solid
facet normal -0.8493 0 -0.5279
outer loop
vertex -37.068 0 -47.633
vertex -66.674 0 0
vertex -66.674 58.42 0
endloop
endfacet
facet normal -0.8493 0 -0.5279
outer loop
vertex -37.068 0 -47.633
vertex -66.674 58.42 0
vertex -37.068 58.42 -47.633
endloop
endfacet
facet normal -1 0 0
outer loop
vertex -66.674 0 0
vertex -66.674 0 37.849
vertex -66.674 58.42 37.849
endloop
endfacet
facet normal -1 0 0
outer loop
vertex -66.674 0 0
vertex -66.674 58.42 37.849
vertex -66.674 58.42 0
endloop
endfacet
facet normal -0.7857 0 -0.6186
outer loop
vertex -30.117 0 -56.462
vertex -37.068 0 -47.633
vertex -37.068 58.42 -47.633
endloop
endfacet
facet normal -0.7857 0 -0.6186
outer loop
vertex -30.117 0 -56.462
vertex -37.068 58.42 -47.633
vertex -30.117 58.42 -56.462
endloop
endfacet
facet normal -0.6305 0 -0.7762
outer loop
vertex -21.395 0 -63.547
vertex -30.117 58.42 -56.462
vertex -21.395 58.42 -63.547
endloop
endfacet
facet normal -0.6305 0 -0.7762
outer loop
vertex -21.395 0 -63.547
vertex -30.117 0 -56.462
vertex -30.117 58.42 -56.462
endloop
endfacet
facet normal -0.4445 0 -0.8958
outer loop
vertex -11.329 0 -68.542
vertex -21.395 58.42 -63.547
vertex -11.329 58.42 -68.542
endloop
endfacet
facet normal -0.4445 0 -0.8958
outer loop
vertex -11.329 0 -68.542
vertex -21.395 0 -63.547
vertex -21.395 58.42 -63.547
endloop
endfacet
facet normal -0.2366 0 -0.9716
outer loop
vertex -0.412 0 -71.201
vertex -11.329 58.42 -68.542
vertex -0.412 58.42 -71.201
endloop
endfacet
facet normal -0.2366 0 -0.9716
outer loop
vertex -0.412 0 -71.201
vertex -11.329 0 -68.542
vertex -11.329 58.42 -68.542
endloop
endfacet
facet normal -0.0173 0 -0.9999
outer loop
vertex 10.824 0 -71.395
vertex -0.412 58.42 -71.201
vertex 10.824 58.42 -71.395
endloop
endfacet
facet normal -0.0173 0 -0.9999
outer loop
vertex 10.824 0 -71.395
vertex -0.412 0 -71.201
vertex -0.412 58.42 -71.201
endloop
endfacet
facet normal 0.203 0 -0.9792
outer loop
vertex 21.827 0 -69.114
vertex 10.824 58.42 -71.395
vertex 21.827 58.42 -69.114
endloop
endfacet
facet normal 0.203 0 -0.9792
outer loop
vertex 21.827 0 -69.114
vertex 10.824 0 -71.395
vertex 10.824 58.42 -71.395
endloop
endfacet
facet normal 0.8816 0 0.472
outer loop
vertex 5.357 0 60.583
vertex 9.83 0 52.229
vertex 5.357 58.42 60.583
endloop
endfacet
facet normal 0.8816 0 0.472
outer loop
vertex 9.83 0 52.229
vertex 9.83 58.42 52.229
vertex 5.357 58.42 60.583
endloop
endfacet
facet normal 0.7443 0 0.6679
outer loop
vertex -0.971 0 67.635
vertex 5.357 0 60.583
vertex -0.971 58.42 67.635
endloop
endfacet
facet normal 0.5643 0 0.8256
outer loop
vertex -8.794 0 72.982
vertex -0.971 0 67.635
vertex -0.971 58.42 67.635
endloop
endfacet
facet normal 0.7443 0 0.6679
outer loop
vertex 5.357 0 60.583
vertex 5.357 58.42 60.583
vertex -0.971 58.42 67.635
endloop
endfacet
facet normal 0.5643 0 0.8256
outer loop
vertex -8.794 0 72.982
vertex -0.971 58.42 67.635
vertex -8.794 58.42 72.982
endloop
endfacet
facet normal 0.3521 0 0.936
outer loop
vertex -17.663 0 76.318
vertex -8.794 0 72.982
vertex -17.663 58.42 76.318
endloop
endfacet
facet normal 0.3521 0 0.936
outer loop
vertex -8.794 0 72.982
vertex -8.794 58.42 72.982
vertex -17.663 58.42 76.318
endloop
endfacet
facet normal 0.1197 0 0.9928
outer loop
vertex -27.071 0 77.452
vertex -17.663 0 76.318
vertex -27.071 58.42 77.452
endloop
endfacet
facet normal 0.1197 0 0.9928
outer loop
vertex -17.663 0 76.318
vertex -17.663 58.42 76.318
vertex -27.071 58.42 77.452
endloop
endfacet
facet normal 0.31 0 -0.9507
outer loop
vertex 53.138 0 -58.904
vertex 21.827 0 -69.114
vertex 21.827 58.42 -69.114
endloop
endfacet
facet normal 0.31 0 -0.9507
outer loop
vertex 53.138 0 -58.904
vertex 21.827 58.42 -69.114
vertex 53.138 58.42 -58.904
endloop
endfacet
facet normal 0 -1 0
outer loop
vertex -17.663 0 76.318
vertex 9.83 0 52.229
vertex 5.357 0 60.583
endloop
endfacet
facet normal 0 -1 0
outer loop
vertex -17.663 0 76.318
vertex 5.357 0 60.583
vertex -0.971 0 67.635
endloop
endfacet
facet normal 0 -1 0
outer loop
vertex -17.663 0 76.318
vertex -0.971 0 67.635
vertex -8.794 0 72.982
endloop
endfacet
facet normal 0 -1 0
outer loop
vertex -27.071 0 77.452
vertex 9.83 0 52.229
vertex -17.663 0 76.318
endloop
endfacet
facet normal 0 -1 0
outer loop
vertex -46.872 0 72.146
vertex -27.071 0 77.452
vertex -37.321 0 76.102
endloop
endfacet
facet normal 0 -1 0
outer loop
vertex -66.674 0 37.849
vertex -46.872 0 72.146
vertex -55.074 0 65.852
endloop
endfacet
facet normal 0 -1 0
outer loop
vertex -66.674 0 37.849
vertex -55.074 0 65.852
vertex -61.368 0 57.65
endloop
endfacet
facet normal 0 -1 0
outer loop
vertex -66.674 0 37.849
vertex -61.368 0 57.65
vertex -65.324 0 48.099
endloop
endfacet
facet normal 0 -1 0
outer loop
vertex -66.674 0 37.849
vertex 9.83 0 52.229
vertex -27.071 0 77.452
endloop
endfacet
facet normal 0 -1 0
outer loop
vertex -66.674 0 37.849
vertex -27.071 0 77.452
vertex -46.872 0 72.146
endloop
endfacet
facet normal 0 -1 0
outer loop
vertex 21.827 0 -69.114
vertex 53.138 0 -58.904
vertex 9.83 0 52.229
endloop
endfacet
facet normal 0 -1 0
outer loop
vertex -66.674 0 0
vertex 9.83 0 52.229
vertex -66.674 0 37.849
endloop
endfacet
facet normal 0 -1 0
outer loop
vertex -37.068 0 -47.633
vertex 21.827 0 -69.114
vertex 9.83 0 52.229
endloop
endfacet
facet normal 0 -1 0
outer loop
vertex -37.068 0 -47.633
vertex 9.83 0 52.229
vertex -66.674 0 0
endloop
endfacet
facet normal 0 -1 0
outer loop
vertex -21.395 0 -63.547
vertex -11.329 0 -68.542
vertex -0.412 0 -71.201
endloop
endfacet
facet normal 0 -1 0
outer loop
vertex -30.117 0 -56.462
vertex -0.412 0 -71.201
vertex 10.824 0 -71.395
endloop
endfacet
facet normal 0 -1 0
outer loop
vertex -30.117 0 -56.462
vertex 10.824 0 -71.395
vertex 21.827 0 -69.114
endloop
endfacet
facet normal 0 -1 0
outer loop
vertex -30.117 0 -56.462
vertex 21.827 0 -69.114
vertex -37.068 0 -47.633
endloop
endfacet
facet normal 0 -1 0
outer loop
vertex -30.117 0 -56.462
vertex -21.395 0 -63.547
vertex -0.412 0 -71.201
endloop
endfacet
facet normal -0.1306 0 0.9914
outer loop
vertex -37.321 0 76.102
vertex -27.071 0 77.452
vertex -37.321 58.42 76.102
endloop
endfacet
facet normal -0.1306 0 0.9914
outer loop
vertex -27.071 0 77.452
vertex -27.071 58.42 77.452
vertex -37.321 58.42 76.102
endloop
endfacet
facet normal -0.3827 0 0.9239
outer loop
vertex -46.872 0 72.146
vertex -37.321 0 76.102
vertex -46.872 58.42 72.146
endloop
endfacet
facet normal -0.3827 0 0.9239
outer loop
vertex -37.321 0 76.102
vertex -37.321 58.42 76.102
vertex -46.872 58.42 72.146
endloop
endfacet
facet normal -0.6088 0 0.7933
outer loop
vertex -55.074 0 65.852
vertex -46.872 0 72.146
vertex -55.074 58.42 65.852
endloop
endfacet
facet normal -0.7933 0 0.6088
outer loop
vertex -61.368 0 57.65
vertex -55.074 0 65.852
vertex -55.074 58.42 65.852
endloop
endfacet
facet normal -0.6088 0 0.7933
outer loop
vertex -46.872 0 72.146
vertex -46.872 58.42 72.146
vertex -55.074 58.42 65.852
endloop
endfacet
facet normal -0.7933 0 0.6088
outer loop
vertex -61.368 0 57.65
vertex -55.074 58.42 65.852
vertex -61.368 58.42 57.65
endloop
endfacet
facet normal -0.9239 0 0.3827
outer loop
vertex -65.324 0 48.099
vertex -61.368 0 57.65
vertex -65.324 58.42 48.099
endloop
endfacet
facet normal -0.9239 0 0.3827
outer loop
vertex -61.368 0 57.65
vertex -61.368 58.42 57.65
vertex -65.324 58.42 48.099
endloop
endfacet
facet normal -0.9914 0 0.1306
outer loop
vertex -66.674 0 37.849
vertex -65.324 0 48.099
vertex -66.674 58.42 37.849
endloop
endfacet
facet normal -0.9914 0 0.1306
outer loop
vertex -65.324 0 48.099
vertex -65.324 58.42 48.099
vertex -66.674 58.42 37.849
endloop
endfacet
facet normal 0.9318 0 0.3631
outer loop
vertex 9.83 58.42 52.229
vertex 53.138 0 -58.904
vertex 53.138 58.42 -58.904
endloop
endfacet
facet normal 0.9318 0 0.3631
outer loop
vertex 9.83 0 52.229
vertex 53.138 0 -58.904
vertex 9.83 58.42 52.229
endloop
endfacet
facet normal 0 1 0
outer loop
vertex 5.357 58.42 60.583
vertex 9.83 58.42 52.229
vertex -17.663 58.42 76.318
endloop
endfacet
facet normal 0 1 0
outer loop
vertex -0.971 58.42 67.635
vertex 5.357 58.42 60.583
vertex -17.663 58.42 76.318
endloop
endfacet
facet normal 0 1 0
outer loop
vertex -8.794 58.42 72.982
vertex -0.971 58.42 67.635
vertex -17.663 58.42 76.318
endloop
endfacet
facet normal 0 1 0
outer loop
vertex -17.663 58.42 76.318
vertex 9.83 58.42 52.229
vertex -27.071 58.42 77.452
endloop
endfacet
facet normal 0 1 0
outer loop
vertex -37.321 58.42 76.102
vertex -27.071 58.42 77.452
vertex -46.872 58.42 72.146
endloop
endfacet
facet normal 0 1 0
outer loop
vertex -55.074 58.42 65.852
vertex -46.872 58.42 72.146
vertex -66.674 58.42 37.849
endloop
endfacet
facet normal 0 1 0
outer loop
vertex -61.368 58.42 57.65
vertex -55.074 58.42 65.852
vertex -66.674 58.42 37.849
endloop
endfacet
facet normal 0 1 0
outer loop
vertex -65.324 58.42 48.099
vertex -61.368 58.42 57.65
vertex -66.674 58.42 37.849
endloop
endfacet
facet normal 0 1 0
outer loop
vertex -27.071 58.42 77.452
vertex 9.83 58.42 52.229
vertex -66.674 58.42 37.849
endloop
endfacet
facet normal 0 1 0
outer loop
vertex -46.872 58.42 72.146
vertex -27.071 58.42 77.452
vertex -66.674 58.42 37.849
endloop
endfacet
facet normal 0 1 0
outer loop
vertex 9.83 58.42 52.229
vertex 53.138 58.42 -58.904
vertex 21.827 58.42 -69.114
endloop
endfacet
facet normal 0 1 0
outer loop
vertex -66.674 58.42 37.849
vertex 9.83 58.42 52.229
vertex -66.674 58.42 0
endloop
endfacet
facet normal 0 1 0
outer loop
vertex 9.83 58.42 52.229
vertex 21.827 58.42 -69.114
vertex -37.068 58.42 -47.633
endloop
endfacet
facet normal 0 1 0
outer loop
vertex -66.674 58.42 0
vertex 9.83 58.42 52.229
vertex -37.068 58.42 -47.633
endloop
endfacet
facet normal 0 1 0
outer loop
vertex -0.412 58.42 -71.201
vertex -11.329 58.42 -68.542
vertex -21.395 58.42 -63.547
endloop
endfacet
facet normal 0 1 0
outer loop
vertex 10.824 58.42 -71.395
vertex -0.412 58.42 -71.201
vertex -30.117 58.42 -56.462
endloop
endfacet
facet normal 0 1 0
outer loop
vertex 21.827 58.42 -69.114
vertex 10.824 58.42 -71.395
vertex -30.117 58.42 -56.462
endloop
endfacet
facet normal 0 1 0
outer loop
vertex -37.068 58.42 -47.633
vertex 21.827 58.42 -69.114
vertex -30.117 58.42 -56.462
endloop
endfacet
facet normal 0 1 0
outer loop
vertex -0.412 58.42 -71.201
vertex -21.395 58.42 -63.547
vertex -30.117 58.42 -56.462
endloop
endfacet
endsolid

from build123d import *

# Parameters (mm, degrees)
BOSS_EXTRUDE1_DEPTH = 58.42
FILLET3_R           = 39.603164


with BuildPart() as part:
    # Sketch1 → Boss-Extrude1 (new body)
    with BuildSketch(Plane(origin=(0, 0, 0), x_dir=(1, 0, 0), z_dir=(0, 1, 0))):
        with BuildLine():
            Line((-66.673768512, 0), (-37.067821873, 47.633329988))
            ThreePointArc((-37.067821873, 47.633329988), (-11.329209284, 68.541566023), (21.82652777, 69.113940477))
            Line((21.82652777, 69.113940477), (53.138492197, 58.903517294))
            Line((53.138492197, 58.903517294), (0, -77.45185891))
            Line((0, -77.45185891), (-66.673768512, -77.45185891))
            Line((-66.673768512, -77.45185891), (-66.673768512, 0))
        make_face()
    extrude(amount=BOSS_EXTRUDE1_DEPTH)

    # Fillet3
    fillet3_edges = [part.edges().sort_by_distance(p)[0] for p in [
        (0, 29.21, 77.45185891),
        (-66.673768512, 29.21, 77.45185891),
    ]]
    fillet(fillet3_edges, radius=FILLET3_R)


solid = part.part
